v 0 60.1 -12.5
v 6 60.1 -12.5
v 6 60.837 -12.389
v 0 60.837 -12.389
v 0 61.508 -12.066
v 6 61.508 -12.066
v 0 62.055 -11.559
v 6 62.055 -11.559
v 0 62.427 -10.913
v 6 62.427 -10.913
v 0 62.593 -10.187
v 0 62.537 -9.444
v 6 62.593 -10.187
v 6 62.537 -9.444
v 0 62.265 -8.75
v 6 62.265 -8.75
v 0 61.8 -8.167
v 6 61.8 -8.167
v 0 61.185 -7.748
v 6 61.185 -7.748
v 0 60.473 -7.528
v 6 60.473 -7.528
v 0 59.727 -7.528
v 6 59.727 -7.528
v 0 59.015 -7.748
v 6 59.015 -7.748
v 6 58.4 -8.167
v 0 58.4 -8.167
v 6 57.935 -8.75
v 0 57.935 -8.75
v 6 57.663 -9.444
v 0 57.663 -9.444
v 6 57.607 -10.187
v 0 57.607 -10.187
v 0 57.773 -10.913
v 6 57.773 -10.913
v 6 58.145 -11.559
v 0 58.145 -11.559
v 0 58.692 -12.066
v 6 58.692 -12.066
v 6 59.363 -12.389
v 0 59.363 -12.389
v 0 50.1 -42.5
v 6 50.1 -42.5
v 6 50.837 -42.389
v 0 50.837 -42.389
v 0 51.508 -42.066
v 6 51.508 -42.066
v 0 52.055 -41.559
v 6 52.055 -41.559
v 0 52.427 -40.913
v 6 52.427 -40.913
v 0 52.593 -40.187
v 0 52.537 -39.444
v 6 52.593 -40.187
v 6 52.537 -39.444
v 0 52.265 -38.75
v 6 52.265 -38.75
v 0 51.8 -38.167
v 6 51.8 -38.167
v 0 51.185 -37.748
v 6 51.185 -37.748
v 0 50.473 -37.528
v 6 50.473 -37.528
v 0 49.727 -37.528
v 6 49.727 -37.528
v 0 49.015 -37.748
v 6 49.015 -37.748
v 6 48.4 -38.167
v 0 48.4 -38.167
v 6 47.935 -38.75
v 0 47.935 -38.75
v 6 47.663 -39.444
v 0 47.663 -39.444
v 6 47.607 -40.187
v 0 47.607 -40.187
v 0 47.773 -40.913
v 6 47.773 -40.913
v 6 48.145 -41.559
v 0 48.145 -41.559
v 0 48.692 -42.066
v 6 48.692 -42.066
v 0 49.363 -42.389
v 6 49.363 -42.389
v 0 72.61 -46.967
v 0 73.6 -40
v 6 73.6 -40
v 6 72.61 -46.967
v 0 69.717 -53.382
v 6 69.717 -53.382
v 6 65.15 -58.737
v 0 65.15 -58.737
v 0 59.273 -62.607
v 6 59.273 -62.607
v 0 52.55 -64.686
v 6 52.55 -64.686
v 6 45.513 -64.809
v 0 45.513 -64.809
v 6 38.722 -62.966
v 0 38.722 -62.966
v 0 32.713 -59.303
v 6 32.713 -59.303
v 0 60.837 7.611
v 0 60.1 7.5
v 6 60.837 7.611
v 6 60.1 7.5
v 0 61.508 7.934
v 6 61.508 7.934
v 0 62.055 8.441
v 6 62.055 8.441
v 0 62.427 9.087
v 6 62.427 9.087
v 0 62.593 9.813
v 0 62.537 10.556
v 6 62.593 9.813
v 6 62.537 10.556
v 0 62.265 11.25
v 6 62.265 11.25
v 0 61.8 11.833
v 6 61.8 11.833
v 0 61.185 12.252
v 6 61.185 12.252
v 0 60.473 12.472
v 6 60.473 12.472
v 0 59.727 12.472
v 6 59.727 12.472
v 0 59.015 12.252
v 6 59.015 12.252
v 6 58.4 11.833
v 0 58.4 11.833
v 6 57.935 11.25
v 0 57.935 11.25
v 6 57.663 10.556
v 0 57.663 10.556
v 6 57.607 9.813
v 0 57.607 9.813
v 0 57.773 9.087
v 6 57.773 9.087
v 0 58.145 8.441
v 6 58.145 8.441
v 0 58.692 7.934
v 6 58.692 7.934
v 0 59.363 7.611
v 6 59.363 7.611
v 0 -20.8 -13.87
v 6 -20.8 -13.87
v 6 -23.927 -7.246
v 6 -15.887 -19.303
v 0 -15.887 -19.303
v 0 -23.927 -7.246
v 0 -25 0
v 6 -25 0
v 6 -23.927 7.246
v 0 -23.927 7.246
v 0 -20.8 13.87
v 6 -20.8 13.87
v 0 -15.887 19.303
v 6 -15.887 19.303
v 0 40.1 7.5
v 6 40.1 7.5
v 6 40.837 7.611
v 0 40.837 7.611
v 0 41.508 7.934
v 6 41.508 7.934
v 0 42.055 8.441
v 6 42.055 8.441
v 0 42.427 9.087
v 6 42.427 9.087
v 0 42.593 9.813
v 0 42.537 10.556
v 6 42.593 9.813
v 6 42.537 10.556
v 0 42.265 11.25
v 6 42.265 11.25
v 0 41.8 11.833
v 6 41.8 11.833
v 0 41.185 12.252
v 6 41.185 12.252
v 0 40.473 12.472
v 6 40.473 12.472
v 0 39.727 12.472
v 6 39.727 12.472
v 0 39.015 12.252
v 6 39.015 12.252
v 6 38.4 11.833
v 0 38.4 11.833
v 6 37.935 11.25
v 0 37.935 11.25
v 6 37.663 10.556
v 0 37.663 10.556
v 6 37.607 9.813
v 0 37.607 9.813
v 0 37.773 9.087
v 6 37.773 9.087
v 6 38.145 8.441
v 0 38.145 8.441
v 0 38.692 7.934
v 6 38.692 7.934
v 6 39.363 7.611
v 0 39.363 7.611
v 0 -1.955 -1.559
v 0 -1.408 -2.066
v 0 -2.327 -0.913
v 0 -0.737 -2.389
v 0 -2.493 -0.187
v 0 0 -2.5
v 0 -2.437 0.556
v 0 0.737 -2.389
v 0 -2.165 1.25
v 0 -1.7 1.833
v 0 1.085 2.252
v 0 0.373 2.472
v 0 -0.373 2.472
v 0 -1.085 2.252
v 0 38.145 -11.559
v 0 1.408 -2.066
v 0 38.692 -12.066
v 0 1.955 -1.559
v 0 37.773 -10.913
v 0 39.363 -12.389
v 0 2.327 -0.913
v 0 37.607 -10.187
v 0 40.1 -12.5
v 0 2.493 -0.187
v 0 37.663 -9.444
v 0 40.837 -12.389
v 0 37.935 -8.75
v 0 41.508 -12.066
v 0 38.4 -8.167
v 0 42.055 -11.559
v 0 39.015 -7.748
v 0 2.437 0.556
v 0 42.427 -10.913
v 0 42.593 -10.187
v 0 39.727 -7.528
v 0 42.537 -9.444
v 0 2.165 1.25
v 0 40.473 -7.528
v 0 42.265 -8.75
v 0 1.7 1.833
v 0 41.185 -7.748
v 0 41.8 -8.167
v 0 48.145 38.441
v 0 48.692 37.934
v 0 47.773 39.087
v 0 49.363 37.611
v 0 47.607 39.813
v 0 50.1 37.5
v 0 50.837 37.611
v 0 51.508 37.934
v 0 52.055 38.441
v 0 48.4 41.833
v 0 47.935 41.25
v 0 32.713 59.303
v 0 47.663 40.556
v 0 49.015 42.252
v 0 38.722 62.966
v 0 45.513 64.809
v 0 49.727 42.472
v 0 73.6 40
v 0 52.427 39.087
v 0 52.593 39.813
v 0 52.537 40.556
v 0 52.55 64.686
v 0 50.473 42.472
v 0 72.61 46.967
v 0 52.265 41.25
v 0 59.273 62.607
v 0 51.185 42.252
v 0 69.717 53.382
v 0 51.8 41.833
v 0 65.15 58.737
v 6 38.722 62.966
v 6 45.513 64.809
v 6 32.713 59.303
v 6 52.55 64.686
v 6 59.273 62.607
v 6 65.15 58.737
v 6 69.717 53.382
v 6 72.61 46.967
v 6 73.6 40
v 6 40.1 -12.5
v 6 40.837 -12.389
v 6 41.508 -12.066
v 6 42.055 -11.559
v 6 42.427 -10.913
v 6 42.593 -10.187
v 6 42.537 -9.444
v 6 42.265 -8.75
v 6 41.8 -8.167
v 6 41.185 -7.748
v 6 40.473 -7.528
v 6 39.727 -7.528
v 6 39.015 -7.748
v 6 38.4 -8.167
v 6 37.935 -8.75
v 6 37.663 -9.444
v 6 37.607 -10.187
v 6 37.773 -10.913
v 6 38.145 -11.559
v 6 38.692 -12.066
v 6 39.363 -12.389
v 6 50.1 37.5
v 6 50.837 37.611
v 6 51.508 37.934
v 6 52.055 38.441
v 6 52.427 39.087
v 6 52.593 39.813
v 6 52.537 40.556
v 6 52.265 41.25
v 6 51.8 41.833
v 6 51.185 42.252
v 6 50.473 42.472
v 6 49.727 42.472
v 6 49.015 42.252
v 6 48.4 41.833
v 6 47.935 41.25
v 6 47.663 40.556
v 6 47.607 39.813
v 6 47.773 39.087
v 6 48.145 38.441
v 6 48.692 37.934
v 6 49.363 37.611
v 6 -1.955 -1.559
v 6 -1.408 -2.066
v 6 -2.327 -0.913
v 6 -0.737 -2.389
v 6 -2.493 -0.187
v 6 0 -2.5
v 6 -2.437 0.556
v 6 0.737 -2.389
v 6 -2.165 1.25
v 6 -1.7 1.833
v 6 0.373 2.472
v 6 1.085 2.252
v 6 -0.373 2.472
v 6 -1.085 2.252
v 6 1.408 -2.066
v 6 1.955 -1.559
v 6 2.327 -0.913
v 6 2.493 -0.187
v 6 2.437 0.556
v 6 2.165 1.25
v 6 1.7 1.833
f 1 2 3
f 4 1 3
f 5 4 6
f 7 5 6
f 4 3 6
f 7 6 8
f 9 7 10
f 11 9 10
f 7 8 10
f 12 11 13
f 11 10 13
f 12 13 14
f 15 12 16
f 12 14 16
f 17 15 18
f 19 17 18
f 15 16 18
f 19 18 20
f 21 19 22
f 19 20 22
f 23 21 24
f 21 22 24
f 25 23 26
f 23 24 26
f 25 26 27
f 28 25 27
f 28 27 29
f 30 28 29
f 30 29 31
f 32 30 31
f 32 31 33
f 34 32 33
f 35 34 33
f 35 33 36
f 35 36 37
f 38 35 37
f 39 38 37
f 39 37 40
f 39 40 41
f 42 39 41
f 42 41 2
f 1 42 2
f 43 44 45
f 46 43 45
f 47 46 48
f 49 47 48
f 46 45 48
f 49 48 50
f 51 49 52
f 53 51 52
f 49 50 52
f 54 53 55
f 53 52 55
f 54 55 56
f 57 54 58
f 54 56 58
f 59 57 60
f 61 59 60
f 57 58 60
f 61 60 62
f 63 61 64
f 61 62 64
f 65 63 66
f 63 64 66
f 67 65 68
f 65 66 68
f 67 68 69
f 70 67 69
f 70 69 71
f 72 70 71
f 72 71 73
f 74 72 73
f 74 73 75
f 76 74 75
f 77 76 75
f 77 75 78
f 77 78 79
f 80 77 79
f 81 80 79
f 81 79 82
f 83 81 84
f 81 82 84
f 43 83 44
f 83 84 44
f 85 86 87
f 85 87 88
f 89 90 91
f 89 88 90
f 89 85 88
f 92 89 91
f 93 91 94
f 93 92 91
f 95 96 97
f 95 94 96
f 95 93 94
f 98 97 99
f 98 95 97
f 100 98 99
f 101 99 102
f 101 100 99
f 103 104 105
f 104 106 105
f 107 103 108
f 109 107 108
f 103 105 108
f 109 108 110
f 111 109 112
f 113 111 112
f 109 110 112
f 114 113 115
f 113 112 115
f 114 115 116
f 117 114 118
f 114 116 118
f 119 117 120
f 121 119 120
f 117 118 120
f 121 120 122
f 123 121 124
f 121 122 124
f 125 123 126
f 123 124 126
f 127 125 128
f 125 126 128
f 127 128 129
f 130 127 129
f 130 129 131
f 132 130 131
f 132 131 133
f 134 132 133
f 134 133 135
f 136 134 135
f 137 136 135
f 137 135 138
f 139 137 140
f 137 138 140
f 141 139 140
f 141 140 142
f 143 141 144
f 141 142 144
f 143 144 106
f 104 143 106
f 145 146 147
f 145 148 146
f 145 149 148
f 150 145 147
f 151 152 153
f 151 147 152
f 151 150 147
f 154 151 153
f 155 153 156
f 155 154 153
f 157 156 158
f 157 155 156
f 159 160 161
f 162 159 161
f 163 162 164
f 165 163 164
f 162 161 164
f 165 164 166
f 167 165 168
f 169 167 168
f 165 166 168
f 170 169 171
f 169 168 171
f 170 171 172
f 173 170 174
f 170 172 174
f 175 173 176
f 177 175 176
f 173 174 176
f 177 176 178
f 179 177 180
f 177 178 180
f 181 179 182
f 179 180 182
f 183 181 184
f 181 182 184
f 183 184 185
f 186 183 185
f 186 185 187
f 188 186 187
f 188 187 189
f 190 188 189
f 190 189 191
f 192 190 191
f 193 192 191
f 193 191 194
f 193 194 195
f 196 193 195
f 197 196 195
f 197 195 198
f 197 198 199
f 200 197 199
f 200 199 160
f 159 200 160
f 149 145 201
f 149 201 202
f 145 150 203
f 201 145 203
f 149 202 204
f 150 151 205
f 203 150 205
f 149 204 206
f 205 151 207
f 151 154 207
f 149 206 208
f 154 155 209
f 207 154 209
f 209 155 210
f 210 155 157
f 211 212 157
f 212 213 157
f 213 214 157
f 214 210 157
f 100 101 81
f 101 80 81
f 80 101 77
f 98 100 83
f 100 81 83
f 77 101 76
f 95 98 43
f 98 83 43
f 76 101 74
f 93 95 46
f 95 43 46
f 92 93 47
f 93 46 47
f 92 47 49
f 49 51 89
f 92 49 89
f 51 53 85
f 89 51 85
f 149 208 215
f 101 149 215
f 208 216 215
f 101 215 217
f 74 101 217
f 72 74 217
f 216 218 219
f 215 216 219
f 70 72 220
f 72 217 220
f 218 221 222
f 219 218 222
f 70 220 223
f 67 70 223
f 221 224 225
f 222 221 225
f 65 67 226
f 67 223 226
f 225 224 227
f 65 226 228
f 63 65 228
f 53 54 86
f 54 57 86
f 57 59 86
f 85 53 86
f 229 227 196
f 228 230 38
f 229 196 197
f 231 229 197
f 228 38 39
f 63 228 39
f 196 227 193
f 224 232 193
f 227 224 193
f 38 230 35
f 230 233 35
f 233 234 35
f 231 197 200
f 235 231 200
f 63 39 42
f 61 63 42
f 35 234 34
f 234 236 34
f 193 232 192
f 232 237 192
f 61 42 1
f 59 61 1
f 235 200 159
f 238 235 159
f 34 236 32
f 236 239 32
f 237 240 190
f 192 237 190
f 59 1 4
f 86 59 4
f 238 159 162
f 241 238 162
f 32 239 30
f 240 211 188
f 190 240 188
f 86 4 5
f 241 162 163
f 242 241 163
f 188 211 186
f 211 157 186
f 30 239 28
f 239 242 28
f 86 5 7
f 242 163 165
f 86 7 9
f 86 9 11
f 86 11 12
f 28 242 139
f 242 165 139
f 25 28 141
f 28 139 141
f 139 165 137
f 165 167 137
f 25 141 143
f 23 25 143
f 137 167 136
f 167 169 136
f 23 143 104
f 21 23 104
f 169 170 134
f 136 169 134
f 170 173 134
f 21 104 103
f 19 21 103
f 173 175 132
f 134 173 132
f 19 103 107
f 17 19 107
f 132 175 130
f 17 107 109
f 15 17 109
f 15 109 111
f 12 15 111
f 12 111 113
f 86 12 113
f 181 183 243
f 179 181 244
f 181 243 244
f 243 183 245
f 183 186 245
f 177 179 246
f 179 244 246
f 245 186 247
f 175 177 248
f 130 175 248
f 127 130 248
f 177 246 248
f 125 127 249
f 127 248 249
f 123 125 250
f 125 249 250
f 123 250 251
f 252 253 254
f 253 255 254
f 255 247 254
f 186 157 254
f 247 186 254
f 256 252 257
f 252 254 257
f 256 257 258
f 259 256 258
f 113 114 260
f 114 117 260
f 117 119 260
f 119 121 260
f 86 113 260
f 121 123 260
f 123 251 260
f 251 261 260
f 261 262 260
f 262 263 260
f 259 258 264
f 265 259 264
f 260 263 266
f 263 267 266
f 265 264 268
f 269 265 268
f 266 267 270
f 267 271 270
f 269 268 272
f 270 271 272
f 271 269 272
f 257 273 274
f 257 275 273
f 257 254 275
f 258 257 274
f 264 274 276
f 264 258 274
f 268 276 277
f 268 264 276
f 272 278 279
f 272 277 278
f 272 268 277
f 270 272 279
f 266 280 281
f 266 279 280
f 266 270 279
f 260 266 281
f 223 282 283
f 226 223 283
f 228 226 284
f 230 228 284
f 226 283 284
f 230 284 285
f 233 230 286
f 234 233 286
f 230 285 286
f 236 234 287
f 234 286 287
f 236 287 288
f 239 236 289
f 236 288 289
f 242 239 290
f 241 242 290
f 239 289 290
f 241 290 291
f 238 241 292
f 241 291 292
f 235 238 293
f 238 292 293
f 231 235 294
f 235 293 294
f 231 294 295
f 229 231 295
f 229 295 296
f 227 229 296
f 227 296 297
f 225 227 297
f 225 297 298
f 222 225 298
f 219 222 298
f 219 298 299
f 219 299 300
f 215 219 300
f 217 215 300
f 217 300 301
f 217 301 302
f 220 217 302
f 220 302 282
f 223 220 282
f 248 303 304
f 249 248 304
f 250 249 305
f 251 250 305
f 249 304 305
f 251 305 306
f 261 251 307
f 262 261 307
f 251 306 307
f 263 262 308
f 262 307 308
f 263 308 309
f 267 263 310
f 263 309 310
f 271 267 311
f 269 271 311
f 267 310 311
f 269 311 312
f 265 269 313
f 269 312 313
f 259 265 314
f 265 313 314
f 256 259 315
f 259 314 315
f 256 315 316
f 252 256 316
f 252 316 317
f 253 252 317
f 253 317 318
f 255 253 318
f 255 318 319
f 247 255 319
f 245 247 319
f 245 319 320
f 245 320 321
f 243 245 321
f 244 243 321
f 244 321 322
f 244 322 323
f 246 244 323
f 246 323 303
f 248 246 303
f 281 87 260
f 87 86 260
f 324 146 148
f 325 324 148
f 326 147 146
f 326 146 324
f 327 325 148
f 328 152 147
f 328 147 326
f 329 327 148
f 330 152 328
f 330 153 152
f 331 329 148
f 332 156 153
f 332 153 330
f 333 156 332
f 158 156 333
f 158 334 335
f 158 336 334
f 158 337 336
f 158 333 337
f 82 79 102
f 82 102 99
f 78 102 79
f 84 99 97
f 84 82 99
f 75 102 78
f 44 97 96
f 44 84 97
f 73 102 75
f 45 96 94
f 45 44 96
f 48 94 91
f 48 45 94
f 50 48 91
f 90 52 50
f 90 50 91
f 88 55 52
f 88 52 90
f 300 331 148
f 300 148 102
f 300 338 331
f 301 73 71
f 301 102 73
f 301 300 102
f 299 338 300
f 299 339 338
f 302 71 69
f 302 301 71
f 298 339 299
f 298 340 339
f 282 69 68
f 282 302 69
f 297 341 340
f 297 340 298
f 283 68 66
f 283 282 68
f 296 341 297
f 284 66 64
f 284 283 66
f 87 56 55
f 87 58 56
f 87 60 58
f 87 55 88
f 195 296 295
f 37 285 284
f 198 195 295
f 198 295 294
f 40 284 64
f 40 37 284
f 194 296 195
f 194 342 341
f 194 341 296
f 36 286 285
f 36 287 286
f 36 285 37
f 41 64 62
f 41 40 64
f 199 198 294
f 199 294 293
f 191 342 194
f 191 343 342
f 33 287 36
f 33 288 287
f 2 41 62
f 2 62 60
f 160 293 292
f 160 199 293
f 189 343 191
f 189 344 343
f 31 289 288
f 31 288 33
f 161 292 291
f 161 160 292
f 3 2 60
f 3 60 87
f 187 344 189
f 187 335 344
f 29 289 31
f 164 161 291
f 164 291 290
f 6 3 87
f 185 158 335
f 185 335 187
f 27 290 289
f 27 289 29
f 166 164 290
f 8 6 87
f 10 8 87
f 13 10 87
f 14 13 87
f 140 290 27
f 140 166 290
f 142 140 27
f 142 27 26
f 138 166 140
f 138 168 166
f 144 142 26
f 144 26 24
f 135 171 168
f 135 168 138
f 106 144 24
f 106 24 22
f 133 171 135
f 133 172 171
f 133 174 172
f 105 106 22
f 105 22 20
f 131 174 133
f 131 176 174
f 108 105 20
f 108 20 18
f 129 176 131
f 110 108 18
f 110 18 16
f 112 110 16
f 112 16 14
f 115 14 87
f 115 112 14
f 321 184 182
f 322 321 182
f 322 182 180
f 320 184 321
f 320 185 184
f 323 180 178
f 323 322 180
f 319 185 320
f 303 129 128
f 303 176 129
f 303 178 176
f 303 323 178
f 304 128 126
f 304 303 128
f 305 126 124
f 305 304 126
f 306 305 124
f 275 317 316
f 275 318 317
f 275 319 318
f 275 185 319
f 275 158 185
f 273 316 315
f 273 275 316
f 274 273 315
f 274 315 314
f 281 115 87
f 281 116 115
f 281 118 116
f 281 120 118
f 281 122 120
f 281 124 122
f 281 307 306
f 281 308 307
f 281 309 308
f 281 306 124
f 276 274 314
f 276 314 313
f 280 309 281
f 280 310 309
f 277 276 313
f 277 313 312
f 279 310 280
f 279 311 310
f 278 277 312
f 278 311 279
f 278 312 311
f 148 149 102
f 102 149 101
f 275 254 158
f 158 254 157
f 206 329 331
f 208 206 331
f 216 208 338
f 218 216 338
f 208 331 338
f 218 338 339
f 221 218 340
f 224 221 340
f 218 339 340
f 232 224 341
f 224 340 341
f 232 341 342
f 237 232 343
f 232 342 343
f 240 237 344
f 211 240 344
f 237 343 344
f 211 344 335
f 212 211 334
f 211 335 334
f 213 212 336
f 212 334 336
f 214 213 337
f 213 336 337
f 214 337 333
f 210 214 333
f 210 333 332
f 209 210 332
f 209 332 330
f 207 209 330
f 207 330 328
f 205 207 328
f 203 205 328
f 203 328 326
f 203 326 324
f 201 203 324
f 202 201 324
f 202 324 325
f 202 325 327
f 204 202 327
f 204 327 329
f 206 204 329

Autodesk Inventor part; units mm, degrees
ref_plane "YZ Plane" through (0, 0, 0) normal (1, 0, 0) x (0, 1, 0)
sketch "Sketch1" plane through (0, 0, 0) normal (1, 0, 0) x (0, 1, 0)
  arc A0 (73.6, 40) -> (32.7129, 59.3028) centre (48.6, 40) ccw
  arc A1 (32.7129, -59.3028) -> (73.6, -40) centre (48.6, -40) ccw
  arc A2 (-15.8871, 19.3028) -> (-15.8871, -19.3028) centre (0, 0) ccw
  line L0 (32.7129, 59.3028) -> (-15.8871, 19.3028)
  line L1 (-15.8871, -19.3028) -> (32.7129, -59.3028)
  line L2 (73.6, -40) -> (73.6, 40)
  dimension "d0" = 80
  dimension "d1" = 48.6
  dimension "d2" = 48.6
  dimension "d3" = 40
  dimension "d4" = 50
  dimension "d5" = 50
  dimension "d6" = 50
ref_plane "Work Plane1" through (6, 0, 0) normal (1, 0, 0) x (0, 0, -1)
sketch "Sketch2" plane through (6, 0, 0) normal (1, 0, 0) x (0, 0, -1)
  circle A0 centre (-40, 50.1) radius 2.5
  circle A1 centre (40, 50.1) radius 2.5
  circle A2 centre (0, 0) radius 2.5
  arc A3 (-19.5369, -15.5983) -> (19.5369, -15.5983) centre (0, 0) ccw projected
  line L0 (19.5369, -15.5983) -> (59.5369, 34.5017) projected
  arc A4 (59.5369, 34.5017) -> (40, 75.1) centre (40, 50.1) ccw projected
  line L1 (40, 75.1) -> (-40, 75.1) projected
  arc A5 (-40, 75.1) -> (-59.5369, 34.5017) centre (-40, 50.1) ccw projected
  line L2 (-59.5369, 34.5017) -> (-19.5369, -15.5983) projected
  dimension "d9" = 5
  dimension "d10" = 5
  dimension "d11" = 5
ref_plane "Work Plane2" through (6, 0, 0) normal (1, 0, 0) x (0, 0, -1)
sketch "Sketch3" plane through (6, 0, 0) normal (1, 0, 0) x (0, 0, -1)
  circle A0 centre (40, 50.1) radius 2.5 projected
  circle A1 centre (-40, 50.1) radius 2.5 projected
  circle A2 centre (0, 0) radius 2.5 projected
  arc A3 (-19.5369, -15.5983) -> (19.5369, -15.5983) centre (0, 0) ccw projected
  line L0 (19.5369, -15.5983) -> (59.5369, 34.5017) projected
  arc A4 (59.5369, 34.5017) -> (40, 75.1) centre (40, 50.1) ccw projected
  line L1 (40, 75.1) -> (-40, 75.1) projected
  arc A5 (-40, 75.1) -> (-59.5369, 34.5017) centre (-40, 50.1) ccw projected
  line L2 (-59.5369, 34.5017) -> (-19.5369, -15.5983) projected
  circle A6 centre (-10, 40.1) radius 2.5
  circle A7 centre (10, 40.1) radius 2.5
  circle A8 centre (10, 60.1) radius 2.5
  circle A9 centre (-10, 60.1) radius 2.5
  dimension "d14" = 5
  dimension "d15" = 5
  dimension "d16" = 5
  dimension "d17" = 5
  dimension "d18" = 20
  dimension "d19" = 20
  dimension "d20" = 20
  dimension "d21" = 20
  dimension "d22" = 15
  dimension "d24" = 10
  dimension "d25" = 15
  dimension "d28" = 10
extrude "Extrusion4" add sketch "Sketch1" along normal blind 6
extrude "Extrusion5" cut sketch "Sketch3" against normal up to next contours A6 | A7 | A8 | A9
extrude "Extrusion6" cut sketch "Sketch2" against normal up to next contours A0 | A1 | A2
properties part number "Arm_Base-SquareBar-Rev3" material "Bronze, Cast"
